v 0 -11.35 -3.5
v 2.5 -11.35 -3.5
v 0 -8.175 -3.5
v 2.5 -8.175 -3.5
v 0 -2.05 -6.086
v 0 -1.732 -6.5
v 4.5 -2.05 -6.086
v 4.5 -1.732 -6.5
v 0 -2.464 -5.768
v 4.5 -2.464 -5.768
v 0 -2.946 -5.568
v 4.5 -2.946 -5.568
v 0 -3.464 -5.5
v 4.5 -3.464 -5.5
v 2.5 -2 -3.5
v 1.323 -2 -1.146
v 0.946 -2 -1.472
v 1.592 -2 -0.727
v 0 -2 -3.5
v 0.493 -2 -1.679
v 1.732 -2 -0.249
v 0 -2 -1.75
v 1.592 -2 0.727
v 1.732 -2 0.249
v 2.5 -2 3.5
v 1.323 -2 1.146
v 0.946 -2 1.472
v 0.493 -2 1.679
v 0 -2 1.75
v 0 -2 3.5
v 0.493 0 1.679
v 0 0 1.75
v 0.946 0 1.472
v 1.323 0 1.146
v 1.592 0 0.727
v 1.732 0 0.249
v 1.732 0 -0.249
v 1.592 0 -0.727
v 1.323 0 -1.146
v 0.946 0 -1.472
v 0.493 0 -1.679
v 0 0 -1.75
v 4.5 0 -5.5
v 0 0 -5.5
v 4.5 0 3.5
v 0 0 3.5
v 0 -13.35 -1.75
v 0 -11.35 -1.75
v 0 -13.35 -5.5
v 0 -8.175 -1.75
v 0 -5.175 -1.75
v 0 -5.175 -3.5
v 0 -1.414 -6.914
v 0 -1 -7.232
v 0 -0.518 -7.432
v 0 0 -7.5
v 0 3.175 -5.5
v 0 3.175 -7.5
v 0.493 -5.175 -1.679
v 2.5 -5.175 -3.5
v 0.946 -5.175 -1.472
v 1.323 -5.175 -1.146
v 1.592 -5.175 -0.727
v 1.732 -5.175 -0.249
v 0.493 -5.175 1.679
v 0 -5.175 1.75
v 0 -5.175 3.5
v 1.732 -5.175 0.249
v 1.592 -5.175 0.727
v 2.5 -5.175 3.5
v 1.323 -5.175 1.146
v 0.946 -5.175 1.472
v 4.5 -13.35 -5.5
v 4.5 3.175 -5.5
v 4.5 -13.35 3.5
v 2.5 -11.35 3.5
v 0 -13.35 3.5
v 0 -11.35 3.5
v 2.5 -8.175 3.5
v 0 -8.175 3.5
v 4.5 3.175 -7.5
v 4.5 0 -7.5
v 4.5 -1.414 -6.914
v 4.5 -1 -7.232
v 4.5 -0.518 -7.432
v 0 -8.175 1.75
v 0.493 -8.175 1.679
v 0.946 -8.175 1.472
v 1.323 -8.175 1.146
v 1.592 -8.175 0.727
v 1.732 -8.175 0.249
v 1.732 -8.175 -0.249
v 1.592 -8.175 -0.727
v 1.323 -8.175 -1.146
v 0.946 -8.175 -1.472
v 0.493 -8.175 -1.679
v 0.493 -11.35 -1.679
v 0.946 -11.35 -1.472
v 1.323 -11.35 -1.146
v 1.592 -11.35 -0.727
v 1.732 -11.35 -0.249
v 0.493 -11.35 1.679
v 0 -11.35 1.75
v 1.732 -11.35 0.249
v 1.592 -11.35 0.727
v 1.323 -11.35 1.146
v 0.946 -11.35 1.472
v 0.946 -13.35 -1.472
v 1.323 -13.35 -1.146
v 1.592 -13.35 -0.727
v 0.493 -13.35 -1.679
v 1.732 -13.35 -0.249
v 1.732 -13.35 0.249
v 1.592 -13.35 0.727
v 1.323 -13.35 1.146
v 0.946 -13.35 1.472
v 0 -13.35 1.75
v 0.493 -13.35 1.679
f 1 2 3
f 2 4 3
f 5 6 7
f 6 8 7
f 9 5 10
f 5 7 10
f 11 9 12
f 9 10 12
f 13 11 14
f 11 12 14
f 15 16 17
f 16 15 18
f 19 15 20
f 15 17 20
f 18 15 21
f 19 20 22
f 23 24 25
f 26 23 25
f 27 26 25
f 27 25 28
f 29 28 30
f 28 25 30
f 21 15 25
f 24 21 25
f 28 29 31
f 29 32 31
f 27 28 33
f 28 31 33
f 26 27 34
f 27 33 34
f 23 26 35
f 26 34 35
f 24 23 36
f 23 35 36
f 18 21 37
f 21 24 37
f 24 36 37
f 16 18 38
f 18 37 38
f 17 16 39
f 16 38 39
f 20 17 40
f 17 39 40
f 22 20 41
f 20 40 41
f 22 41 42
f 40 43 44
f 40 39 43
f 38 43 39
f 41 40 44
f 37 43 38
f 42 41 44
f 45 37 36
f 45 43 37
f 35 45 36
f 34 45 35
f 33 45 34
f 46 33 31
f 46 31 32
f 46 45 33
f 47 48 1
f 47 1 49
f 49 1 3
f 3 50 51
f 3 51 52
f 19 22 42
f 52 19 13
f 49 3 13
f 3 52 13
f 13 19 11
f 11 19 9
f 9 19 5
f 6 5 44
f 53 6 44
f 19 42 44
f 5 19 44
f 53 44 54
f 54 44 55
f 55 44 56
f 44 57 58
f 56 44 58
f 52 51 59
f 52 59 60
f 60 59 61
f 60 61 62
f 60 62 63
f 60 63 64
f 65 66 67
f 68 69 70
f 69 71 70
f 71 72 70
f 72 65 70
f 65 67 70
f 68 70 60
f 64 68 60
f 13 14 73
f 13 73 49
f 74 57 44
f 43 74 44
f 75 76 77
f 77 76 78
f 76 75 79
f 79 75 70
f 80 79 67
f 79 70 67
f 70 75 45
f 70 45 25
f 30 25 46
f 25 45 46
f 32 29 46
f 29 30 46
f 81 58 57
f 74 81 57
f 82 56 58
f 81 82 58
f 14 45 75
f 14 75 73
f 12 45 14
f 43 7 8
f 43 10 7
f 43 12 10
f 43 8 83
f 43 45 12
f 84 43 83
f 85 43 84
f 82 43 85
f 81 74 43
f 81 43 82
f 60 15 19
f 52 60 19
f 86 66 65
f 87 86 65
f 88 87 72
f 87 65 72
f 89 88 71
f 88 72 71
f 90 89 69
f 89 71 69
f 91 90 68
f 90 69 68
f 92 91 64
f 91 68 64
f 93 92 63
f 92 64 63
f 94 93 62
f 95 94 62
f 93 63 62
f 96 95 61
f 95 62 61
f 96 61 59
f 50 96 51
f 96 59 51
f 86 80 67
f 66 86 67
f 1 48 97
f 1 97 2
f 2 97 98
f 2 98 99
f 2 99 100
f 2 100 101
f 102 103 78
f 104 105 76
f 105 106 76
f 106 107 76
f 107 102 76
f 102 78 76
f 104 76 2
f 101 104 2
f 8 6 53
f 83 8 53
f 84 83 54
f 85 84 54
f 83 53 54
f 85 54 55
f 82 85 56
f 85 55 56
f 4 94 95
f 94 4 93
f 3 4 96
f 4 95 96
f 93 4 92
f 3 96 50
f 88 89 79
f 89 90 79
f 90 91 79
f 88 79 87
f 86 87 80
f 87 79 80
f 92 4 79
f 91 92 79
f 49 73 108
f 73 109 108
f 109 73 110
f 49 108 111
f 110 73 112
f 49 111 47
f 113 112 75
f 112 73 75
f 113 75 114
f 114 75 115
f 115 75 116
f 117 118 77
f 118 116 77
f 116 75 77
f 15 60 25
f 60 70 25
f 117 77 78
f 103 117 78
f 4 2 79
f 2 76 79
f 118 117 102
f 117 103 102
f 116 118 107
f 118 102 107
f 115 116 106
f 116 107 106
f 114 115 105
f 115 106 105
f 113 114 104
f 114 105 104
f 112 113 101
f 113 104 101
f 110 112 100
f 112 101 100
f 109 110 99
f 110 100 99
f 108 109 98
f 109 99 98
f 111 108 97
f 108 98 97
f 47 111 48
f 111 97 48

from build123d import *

# Parameters (mm, degrees)
BOSS_EXTRUDE3_DEPTH = 3.5
SKETCH6_W           = 4.5
SKETCH6_H           = 13.35
BOSS_EXTRUDE4_DEPTH = 2
SKETCH7_R           = 1.75
CUT_EXTRUDE2_DEPTH  = 16.123574313
BOSS_EXTRUDE7_DEPTH = 4.5
FILLET1_R           = 2


with BuildPart() as part:
    # Sketch5 → Boss-Extrude3 (new, symmetric)
    with BuildSketch(Plane.XY):
        Polygon((0, 0), (4.5, 0), (4.5, -13.35), (0, -13.35), (0, -11.35), (2.5, -11.35), (2.5, -8.175), (0, -8.175), (0, -5.175), (2.5, -5.175), (2.5, -2), (0, -2), align=None)
    extrude(amount=BOSS_EXTRUDE3_DEPTH, both=True)

    # Sketch6 → Boss-Extrude4 (add)
    with BuildSketch(Plane(origin=(0, 0, -3.5), x_dir=(-1, 0, 0), z_dir=(0, 0, -1))):
        with Locations((-2.25, -6.675)):
            Rectangle(SKETCH6_W, SKETCH6_H)
    extrude(amount=BOSS_EXTRUDE4_DEPTH)

    # Sketch7 → Cut-Extrude2 (cut, through all)
    with BuildSketch(Plane(origin=(0, 0, 0), x_dir=(1, 0, 0), z_dir=(0, 1, 0))):
        Circle(SKETCH7_R)
    extrude(amount=-CUT_EXTRUDE2_DEPTH, mode=Mode.SUBTRACT)

    # Sketch9 → Boss-Extrude7 (add, through all)
    with BuildSketch(Plane.ZY):
        with BuildLine():
            Line((-7.5, 3.175), (-5.5, 3.175))
            Line((-5.5, 3.175), (-5.5, 0))
            Line((-5.5, 0), (-5.5, -2))
            ThreePointArc((-5.5, -2), (-6.914213562, -1.414213562), (-7.5, 0))
            Line((-7.5, 0), (-7.5, 3.175))
        make_face()
    extrude(amount=-BOSS_EXTRUDE7_DEPTH)

    # Fillet1
    fillet1_edges = [part.edges().sort_by_distance(p)[0] for p in [
        (2.25, -2, -5.5),
    ]]
    fillet(fillet1_edges, radius=FILLET1_R)


solid = part.part
